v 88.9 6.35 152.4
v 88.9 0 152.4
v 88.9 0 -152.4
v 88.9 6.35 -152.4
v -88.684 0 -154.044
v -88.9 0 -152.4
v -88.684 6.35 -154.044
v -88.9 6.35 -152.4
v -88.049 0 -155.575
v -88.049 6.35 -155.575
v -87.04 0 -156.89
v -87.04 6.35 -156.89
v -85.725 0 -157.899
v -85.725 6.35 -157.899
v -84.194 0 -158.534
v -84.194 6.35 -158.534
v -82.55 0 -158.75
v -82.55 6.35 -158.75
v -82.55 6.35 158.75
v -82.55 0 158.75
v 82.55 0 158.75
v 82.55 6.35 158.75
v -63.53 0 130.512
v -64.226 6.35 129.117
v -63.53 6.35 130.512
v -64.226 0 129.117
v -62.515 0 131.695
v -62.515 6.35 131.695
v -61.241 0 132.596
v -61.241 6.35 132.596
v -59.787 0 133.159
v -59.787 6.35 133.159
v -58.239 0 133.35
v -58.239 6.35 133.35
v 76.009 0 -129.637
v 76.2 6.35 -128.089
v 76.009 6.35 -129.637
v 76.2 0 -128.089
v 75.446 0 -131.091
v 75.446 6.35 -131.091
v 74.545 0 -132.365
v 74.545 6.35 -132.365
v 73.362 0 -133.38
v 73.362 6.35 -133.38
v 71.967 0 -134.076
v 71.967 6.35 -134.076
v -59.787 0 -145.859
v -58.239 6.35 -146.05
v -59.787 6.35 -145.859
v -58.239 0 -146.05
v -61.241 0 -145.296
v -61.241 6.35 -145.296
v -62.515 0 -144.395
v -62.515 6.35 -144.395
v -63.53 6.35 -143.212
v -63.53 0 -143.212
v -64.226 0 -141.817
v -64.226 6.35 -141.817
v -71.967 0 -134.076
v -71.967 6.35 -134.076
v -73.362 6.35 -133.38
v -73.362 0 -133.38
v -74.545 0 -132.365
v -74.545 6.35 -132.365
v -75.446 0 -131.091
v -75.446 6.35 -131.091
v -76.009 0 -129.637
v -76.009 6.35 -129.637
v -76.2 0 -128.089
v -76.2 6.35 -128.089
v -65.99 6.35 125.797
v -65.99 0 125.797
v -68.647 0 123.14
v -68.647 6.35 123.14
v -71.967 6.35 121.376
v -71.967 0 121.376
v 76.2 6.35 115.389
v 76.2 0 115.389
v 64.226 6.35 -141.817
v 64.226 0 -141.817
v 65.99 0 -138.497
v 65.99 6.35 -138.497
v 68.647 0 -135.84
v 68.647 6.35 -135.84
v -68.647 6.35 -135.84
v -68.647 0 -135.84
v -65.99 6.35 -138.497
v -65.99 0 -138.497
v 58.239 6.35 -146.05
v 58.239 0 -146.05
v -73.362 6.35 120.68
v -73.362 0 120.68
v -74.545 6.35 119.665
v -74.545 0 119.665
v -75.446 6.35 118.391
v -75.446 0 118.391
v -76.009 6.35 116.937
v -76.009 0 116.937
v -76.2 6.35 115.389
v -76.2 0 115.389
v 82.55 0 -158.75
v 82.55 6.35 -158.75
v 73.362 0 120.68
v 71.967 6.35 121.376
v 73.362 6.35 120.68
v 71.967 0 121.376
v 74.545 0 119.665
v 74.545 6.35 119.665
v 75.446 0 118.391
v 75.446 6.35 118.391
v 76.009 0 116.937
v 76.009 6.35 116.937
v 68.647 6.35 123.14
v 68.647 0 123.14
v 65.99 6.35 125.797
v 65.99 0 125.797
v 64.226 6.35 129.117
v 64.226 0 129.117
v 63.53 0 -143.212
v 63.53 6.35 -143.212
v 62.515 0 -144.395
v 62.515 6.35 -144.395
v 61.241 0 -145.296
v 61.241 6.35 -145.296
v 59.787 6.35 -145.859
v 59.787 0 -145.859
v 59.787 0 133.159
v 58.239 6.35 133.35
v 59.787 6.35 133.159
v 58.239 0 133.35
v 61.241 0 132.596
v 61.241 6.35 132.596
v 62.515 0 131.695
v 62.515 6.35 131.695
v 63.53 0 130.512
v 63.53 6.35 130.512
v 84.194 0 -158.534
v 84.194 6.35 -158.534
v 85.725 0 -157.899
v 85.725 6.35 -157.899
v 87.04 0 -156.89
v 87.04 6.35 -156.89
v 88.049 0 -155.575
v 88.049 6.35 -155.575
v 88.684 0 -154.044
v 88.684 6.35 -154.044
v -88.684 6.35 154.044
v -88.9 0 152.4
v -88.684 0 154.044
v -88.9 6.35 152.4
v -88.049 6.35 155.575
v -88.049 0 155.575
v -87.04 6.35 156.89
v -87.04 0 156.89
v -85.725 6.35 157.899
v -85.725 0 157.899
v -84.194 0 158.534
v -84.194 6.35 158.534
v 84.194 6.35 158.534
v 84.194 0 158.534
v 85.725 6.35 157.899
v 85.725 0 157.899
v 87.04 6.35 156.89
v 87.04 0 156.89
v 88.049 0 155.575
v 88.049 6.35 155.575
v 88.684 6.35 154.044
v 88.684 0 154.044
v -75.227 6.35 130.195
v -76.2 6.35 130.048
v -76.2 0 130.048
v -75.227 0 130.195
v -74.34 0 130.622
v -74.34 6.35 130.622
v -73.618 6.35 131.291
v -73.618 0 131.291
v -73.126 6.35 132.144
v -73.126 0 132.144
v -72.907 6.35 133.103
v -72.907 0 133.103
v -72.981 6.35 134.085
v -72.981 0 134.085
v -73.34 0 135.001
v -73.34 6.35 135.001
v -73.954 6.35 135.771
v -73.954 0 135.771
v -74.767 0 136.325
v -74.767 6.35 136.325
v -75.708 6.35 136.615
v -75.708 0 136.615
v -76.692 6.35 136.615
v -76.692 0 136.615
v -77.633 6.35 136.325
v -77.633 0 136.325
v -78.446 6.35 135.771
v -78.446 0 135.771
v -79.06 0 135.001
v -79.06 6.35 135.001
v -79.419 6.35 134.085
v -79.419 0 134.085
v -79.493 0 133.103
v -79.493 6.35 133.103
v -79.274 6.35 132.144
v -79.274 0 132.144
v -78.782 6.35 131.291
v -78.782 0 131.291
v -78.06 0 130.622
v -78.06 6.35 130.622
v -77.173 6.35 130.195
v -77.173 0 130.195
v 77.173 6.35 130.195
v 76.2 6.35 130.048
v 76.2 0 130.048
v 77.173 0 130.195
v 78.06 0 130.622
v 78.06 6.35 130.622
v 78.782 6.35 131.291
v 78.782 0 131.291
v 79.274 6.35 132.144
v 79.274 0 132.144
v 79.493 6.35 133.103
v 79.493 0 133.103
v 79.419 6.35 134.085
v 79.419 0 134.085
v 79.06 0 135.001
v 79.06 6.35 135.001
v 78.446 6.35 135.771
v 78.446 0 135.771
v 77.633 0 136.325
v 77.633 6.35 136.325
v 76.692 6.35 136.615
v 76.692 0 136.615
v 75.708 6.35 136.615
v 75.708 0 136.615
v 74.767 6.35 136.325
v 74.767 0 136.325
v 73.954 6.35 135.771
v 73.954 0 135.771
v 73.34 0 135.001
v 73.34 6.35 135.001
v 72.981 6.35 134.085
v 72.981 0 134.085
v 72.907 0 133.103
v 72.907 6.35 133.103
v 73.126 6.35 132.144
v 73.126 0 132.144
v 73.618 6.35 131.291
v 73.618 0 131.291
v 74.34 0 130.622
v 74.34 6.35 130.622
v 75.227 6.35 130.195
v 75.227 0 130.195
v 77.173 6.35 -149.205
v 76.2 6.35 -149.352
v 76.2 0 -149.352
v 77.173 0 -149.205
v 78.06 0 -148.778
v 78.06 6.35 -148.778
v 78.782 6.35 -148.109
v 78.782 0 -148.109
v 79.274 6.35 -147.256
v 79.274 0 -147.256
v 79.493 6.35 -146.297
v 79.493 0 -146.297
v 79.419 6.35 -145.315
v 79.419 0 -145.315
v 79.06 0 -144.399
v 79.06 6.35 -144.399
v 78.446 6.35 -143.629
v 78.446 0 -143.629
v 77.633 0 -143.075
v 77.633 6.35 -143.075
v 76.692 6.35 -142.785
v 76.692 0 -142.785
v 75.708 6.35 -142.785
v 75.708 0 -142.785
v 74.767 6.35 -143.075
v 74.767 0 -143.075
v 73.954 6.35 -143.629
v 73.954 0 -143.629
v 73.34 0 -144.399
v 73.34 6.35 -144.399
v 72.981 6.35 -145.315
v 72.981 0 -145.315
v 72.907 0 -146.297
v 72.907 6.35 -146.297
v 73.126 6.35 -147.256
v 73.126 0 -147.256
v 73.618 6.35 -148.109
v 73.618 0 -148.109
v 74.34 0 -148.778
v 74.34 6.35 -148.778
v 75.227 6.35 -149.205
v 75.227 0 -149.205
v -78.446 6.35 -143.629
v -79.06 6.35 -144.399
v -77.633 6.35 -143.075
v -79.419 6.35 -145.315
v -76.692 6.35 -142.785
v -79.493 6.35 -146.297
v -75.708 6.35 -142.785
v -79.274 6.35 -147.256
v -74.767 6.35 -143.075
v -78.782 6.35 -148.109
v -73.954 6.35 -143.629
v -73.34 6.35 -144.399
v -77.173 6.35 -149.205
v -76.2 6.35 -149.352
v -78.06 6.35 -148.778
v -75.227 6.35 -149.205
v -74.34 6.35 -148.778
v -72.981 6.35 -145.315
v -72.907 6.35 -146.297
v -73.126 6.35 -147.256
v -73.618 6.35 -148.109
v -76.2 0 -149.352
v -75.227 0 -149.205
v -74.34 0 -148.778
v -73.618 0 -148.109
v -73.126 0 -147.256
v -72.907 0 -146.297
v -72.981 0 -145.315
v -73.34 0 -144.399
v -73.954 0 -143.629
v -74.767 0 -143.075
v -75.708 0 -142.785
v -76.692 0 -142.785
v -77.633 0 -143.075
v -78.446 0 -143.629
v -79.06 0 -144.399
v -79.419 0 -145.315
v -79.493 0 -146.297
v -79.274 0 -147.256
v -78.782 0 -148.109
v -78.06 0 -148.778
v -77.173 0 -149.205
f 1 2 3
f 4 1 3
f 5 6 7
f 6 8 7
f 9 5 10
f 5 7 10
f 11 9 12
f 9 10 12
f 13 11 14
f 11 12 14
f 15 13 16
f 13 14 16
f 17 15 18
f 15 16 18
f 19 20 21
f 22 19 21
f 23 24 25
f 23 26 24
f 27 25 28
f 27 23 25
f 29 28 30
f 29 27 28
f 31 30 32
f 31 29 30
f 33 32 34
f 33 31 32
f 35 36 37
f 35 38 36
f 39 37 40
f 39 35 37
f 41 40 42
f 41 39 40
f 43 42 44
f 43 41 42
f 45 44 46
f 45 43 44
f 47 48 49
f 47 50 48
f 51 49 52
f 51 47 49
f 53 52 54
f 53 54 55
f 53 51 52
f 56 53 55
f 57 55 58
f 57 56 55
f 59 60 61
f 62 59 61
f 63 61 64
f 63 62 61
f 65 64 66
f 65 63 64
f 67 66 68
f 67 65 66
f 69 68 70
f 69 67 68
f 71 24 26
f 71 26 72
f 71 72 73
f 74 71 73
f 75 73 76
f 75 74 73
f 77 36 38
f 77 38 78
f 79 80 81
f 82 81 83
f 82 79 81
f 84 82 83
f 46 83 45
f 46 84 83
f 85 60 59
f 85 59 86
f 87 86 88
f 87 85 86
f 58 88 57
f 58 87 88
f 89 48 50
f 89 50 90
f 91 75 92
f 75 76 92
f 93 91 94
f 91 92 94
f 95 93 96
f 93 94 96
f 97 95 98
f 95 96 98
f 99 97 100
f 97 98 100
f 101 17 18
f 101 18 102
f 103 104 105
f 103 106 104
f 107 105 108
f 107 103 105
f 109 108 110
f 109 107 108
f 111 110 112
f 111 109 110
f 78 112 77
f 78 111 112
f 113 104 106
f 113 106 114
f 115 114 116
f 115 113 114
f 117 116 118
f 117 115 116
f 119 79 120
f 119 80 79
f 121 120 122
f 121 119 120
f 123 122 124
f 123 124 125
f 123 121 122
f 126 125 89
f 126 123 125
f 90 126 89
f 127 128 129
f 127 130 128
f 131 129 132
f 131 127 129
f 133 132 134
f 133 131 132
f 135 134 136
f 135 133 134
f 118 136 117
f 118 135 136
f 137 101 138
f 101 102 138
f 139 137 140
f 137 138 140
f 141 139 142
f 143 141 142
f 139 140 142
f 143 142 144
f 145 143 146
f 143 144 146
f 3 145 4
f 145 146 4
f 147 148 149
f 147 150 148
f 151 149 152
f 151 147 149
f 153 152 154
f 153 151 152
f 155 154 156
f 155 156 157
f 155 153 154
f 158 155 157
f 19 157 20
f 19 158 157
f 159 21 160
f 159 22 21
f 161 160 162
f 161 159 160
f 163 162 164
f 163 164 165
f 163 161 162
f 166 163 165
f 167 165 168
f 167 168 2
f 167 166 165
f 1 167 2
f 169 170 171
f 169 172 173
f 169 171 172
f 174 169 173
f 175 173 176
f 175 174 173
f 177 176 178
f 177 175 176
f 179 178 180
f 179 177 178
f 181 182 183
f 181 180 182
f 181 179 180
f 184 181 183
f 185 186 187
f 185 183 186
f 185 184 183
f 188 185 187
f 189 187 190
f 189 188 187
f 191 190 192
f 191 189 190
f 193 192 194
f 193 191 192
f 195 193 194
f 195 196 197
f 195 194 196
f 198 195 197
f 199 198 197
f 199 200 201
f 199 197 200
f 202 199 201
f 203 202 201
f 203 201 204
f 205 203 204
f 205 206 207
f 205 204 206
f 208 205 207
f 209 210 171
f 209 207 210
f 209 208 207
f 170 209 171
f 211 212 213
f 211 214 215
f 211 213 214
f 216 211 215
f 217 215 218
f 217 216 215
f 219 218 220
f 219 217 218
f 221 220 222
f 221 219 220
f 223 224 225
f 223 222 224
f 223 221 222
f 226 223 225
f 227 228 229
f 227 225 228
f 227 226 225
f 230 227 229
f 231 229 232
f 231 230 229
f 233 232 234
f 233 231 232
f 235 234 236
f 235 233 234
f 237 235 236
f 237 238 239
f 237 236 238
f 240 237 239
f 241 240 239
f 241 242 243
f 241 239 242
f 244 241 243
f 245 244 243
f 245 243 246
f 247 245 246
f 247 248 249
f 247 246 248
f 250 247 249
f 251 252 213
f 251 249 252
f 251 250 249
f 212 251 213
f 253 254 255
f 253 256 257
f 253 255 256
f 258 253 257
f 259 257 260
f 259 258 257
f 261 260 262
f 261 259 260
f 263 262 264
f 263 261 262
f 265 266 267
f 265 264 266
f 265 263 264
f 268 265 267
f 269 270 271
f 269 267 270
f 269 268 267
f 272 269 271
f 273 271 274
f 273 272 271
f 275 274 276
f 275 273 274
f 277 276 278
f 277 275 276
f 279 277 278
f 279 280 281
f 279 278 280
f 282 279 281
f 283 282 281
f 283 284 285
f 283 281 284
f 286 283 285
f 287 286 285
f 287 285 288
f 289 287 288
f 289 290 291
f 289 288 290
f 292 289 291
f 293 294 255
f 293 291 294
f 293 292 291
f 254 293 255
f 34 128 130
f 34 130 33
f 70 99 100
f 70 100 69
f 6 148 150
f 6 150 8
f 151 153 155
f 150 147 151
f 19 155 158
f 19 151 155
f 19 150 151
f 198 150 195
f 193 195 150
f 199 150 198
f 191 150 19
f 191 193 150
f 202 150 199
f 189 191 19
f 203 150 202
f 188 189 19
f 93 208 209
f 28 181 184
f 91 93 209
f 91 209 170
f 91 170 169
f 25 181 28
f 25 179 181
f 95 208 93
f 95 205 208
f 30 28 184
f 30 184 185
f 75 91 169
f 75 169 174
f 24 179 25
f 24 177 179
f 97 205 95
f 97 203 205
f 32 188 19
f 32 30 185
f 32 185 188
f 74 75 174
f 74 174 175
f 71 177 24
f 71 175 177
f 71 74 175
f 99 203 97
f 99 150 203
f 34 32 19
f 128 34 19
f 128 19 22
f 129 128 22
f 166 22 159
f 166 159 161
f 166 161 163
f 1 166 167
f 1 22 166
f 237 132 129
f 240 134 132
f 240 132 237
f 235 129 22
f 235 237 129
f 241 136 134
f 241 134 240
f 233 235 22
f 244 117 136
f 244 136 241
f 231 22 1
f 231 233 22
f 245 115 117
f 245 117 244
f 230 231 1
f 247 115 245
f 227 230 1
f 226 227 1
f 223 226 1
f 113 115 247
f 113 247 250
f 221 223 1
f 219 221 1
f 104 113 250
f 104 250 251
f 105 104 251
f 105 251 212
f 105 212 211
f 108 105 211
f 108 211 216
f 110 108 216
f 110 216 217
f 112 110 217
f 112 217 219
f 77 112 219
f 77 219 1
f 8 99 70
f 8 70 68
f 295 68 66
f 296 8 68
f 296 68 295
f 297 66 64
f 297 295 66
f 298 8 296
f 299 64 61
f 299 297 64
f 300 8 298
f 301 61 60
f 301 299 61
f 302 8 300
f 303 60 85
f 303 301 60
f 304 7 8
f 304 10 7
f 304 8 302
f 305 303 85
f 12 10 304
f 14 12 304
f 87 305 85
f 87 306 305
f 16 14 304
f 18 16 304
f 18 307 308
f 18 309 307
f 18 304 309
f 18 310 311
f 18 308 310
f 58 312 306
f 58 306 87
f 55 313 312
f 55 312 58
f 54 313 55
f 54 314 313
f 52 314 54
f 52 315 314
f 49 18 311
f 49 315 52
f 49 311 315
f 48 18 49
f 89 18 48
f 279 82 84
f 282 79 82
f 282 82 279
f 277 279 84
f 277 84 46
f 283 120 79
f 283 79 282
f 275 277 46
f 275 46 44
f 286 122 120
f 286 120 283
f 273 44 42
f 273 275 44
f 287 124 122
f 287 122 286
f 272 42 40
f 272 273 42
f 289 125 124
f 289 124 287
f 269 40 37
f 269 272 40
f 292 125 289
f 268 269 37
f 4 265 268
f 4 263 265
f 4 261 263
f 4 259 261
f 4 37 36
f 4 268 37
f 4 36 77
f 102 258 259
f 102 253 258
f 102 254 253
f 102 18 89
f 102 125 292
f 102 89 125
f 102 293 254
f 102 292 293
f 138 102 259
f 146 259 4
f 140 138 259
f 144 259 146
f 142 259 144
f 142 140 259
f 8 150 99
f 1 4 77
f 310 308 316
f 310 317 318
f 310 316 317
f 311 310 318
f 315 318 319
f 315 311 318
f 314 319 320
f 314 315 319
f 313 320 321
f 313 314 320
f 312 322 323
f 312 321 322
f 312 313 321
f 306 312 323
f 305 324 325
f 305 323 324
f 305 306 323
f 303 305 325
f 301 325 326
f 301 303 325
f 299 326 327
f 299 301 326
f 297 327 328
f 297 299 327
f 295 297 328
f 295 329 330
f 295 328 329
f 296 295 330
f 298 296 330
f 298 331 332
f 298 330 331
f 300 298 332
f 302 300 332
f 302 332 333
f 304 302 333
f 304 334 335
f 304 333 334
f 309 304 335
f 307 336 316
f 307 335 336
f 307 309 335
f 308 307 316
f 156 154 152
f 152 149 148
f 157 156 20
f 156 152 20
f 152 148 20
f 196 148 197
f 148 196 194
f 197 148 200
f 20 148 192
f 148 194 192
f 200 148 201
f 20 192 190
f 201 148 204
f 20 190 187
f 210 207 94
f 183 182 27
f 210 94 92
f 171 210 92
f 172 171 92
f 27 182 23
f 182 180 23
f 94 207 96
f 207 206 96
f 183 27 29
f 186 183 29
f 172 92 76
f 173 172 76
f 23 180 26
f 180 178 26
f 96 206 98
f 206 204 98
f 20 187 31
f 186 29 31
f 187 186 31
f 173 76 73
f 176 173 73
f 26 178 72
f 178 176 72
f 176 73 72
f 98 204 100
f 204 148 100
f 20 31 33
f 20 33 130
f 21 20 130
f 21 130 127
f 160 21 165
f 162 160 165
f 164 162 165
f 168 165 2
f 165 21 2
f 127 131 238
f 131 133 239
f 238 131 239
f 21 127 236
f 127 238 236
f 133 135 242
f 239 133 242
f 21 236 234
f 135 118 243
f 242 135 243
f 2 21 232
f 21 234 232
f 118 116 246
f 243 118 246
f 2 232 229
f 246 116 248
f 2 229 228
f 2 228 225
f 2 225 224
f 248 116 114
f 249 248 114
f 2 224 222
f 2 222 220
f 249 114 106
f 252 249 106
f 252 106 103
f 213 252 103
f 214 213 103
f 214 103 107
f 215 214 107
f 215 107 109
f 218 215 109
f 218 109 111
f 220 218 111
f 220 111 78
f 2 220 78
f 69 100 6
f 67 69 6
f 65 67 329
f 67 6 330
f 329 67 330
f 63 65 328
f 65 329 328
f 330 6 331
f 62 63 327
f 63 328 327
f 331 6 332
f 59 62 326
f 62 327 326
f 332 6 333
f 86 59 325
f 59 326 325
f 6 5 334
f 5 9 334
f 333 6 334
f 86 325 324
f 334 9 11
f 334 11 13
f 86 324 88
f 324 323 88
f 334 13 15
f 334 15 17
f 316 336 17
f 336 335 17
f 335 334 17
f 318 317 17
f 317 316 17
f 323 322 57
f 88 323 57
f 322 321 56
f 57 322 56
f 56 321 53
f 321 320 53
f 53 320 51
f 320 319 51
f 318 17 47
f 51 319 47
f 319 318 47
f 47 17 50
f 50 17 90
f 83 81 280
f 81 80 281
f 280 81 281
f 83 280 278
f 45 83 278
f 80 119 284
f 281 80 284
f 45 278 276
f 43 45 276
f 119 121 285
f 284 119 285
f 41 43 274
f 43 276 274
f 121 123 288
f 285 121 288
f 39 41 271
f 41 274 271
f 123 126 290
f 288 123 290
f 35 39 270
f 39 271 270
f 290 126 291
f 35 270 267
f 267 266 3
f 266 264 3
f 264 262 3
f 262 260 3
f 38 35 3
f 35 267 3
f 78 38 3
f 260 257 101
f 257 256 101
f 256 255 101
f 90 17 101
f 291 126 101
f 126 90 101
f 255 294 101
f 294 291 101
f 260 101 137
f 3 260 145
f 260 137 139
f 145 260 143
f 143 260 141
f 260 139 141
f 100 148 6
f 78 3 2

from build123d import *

# Parameters (mm, degrees)
SKETCH1_W               = 177.8
SKETCH1_H               = 317.5
BASE_DEPTH              = 6.35
HOLES_DEPTH             = 183.057944073
HOLES_DEPTH_BACK        = 183.057944073
SKETCH3_R               = 3.302
INNER_CUTOUT_DEPTH      = 183.057944073
INNER_CUTOUT_DEPTH_BACK = 183.057944073
FILLET1_R               = 6.35


with BuildPart() as part:
    # Sketch1 → Base (new body)
    with BuildSketch(Plane(origin=(0, 0, 0), x_dir=(1, 0, 0), z_dir=(0, 1, 0))):
        Rectangle(SKETCH1_W, SKETCH1_H)
    extrude(amount=BASE_DEPTH)

    # Sketch3 → Holes (cut, two sides: drawn at the far end of the back side and taken through both)
    with BuildSketch(Plane.XZ.offset(-HOLES_DEPTH_BACK)):
        with Locations(Location((-76.2, -146.05, 0), (0, 0, 270))):
            Circle(SKETCH3_R)
        with Locations(Location((76.2, -146.05, 0), (0, 0, 270))):
            Circle(SKETCH3_R)
        with Locations(Location((76.2, 133.35, 0), (0, 0, 270))):
            Circle(SKETCH3_R)
        with Locations(Location((-76.2, 133.35, 0), (0, 0, 270))):
            Circle(SKETCH3_R)
    extrude(amount=HOLES_DEPTH + HOLES_DEPTH_BACK, mode=Mode.SUBTRACT)

    # Sketch6 → Inner Cutout (cut, two sides: drawn at the far end of the back side and taken through both)
    with BuildSketch(Plane.XZ.offset(-INNER_CUTOUT_DEPTH_BACK)):
        with BuildLine():
            Line((-76.2, 120.65), (-76.2, -133.35))
            ThreePointArc((-76.2, -133.35), (-67.219743879, -137.069743879), (-63.5, -146.05))
            Line((-63.5, -146.05), (63.5, -146.05))
            ThreePointArc((63.5, -146.05), (67.219743879, -137.069743879), (76.2, -133.35))
            Line((76.2, -133.35), (76.2, 120.65))
            ThreePointArc((76.2, 120.65), (67.219743879, 124.369743879), (63.5, 133.35))
            Line((63.5, 133.35), (-63.5, 133.35))
            ThreePointArc((-63.5, 133.35), (-67.219743879, 124.369743879), (-76.2, 120.65))
        make_face()
    extrude(amount=INNER_CUTOUT_DEPTH + INNER_CUTOUT_DEPTH_BACK, mode=Mode.SUBTRACT)

    # Fillet1
    fillet1_edges = [part.edges().sort_by_distance(p)[0] for p in [
        (-76.2, 3.175, 120.65),
        (-63.5, 3.175, 133.35),
        (63.5, 3.175, 133.35),
        (76.2, 3.175, 120.65),
        (76.2, 3.175, -133.35),
        (63.5, 3.175, -146.05),
        (-63.5, 3.175, -146.05),
        (-76.2, 3.175, -133.35),
        (88.9, 3.175, 158.75),
        (-88.9, 3.175, 158.75),
        (-88.9, 3.175, -158.75),
        (88.9, 3.175, -158.75),
    ]]
    fillet(fillet1_edges, radius=FILLET1_R)


solid = part.part
